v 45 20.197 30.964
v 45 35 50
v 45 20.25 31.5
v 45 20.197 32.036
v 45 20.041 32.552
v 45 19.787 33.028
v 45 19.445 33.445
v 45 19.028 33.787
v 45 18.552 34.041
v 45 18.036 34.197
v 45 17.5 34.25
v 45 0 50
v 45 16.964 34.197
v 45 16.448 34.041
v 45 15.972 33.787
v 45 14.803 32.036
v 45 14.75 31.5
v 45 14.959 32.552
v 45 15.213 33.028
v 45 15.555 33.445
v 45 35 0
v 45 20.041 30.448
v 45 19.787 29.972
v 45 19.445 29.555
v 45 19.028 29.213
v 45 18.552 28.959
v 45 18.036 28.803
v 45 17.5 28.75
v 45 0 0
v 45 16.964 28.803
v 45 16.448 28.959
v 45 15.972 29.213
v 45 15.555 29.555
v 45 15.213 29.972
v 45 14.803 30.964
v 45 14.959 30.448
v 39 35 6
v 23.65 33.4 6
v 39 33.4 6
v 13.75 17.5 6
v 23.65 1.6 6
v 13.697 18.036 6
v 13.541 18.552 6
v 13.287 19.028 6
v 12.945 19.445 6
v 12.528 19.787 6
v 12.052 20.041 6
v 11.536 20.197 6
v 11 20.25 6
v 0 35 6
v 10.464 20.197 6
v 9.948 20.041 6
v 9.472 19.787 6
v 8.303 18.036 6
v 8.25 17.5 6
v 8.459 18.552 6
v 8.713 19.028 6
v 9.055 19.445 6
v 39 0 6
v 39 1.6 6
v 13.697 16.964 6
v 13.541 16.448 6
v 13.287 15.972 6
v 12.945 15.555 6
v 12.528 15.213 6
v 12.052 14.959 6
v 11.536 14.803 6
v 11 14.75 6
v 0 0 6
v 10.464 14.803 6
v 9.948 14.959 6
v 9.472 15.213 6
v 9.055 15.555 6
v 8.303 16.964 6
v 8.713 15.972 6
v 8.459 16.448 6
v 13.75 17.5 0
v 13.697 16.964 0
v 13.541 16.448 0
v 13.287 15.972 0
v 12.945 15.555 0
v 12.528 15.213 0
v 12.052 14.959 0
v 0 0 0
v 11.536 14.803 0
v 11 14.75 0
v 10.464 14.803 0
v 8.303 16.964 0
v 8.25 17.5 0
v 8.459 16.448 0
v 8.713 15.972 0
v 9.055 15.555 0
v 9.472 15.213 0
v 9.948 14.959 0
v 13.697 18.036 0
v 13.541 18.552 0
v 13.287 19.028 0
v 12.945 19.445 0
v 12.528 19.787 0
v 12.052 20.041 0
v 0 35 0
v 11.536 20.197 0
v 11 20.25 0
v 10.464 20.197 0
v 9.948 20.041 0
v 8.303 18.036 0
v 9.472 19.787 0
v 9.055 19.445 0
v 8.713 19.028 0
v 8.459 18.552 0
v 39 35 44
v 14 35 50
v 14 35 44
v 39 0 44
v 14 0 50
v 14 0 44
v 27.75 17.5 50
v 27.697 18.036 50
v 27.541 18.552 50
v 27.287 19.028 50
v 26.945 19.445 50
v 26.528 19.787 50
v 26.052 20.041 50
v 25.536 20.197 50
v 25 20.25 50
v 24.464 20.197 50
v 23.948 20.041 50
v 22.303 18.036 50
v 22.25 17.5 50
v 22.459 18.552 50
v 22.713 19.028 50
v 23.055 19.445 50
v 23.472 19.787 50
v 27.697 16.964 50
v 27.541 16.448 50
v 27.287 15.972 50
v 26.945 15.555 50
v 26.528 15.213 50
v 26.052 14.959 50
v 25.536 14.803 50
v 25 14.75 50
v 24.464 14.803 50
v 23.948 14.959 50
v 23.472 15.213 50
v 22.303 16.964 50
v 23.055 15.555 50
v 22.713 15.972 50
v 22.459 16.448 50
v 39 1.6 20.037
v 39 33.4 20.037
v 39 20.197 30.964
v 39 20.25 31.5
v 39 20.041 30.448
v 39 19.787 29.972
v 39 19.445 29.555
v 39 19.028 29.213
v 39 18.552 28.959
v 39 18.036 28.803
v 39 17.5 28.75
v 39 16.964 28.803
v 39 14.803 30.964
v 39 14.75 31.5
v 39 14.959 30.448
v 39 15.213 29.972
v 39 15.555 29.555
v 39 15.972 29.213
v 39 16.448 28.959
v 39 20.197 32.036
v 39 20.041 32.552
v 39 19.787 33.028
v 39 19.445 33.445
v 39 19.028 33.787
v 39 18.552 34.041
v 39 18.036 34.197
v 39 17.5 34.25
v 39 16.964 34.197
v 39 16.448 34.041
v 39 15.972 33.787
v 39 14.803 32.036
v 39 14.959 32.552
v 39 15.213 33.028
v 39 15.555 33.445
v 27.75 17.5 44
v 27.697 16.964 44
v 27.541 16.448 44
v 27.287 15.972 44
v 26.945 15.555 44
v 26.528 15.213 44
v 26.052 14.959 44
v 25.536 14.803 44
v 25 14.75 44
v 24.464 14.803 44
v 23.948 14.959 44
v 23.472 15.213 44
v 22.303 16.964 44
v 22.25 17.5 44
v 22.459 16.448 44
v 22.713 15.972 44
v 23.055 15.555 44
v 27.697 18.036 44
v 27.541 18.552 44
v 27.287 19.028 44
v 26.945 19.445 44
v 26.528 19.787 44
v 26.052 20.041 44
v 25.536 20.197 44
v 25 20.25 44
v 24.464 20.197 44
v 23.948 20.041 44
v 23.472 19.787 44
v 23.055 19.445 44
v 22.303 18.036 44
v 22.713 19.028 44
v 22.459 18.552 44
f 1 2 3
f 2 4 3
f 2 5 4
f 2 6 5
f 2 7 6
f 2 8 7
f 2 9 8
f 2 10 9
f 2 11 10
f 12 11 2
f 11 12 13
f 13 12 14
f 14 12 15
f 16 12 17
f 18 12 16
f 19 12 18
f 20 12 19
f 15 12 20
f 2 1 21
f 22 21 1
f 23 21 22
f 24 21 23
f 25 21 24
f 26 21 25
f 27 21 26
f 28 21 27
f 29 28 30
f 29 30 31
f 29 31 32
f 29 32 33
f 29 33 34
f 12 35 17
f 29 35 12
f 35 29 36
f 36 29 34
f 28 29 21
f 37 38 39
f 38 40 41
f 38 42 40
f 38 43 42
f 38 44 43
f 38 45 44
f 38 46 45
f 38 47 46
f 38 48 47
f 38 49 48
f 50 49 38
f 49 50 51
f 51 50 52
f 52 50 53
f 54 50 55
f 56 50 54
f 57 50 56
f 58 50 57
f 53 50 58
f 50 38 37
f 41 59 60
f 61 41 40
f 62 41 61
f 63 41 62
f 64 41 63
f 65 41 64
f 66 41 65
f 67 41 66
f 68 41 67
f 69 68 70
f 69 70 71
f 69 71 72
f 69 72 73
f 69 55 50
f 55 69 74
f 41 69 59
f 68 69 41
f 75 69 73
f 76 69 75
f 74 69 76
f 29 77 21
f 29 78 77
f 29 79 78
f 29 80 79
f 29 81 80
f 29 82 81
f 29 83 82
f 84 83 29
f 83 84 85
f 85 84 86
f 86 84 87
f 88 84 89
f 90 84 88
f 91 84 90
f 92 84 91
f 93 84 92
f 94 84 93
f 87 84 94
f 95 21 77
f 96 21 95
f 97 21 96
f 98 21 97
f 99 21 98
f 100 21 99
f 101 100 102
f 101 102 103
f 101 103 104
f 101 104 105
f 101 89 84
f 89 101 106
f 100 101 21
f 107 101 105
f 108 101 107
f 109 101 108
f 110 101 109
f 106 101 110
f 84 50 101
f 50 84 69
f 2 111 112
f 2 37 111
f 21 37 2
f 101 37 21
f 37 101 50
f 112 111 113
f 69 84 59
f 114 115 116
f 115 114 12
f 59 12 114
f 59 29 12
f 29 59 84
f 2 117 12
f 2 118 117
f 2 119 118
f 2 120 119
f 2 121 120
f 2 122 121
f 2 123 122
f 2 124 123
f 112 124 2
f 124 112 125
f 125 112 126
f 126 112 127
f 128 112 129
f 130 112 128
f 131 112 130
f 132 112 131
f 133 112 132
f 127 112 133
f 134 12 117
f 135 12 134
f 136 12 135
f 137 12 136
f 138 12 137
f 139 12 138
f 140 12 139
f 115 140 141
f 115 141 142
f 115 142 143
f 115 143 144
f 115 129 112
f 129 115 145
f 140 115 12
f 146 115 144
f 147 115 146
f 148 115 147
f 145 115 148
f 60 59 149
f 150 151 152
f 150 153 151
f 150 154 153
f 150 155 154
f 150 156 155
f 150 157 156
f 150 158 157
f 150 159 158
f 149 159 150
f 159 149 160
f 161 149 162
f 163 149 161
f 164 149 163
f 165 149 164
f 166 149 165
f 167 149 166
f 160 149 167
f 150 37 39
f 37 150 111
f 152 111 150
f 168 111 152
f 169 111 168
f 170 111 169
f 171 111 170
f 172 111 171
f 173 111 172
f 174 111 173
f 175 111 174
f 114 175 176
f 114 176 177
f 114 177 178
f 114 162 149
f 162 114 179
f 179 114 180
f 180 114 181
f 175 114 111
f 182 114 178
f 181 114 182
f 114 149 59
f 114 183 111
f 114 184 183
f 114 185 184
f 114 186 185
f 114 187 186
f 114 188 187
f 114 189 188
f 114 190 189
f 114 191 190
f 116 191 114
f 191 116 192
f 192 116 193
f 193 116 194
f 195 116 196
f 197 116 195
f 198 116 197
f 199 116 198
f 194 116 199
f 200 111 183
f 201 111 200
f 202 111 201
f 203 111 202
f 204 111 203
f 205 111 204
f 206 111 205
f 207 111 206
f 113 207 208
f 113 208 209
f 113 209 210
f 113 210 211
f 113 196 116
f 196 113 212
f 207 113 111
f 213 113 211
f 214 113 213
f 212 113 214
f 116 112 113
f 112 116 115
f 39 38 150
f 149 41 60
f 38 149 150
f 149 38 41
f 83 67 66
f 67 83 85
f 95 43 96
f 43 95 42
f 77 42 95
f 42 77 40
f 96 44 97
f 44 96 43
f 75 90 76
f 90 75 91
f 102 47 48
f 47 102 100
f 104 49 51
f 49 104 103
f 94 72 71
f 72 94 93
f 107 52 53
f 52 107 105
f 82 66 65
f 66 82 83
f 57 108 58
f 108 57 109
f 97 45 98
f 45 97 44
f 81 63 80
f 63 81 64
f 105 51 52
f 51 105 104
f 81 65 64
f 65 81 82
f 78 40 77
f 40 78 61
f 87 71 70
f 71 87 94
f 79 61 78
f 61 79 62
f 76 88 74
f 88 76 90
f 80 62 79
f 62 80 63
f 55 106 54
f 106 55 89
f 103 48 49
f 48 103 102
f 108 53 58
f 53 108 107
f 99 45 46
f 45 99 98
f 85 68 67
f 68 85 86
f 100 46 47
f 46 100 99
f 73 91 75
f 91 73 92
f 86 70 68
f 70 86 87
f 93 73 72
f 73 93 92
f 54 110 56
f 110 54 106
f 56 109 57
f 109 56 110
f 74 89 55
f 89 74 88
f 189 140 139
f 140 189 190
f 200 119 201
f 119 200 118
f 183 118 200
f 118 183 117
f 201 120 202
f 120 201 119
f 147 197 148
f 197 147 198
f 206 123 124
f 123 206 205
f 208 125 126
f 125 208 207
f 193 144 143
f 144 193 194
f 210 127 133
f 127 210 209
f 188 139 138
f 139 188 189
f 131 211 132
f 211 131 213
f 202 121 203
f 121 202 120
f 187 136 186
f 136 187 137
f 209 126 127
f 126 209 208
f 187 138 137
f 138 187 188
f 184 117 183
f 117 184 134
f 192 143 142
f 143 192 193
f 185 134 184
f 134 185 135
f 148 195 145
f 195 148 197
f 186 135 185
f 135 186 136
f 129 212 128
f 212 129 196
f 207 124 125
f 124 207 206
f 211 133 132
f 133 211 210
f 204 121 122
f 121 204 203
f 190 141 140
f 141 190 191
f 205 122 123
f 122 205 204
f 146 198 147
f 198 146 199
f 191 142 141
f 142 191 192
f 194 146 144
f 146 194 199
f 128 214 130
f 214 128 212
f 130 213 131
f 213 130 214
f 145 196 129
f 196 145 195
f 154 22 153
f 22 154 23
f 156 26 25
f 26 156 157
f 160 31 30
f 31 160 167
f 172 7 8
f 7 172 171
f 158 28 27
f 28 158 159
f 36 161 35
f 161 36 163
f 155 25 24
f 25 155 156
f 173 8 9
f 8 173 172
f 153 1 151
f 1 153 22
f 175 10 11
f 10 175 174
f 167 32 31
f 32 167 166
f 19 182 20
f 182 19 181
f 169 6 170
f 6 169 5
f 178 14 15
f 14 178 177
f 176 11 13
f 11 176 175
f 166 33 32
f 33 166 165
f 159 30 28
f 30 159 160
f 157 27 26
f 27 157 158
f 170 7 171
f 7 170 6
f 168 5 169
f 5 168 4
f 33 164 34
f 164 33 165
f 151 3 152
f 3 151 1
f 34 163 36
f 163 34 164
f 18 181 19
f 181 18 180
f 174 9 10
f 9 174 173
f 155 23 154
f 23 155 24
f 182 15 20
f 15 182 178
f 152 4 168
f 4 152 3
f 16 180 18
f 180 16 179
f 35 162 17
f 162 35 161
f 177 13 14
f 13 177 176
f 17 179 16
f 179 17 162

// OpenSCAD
$fn = 32;

// ----------------------------------------------------------------------
// Z-bracket: 45 x 35 x 50 mm
// ----------------------------------------------------------------------

// --- parameters (mm) ---
foot_len = 45;            // lower foot length, X
top_len = 25;             // upper foot length, X
depth = 35;               // bracket width, Y
step_h = 50;              // overall rise, Z
plate_t = 6;              // plate thickness
hole_d = 5.5;             // clearance for M5
rib_len = 17.1;           // gusset leg
rib_sink = 1.6;           // gusset overlap into the plates

module hole_z(px, py, z0) {
  translate([px, py, z0 - 2.5]) cylinder(h = plate_t + 5, d = hole_d);
}
module hole_x(py, pz) {
  translate([-2.5, py, pz]) rotate([0, 90, 0]) cylinder(h = plate_t + 5, d = hole_d);
}
module gusset(x0) {
  translate([x0, depth - rib_sink, 0])
    rotate([90, 0, 0])
      linear_extrude(height = depth - 2 * rib_sink)
        polygon(points = [[rib_sink, plate_t - rib_sink],
                          [rib_sink, plate_t - rib_sink + rib_len],
                          [-rib_len, plate_t - rib_sink]]);
}

difference() {
  union() {
    cube([foot_len, depth, plate_t]);
    /* web, overlapping the lower foot */
    translate([foot_len - plate_t, 0, 0]) cube([plate_t, depth, step_h]);
    /* upper foot, sunk into the web */
    translate([foot_len - plate_t - top_len, 0, step_h - plate_t]) cube([top_len + plate_t, depth, plate_t]);
    gusset(foot_len - plate_t);
  }
  hole_z(11, 17.5, 0);
  translate([foot_len - plate_t - 14, 0, 0]) hole_z(0, 17.5, step_h - plate_t);
  translate([foot_len - plate_t, 0, 0]) hole_x(17.5, 31.5);
}
